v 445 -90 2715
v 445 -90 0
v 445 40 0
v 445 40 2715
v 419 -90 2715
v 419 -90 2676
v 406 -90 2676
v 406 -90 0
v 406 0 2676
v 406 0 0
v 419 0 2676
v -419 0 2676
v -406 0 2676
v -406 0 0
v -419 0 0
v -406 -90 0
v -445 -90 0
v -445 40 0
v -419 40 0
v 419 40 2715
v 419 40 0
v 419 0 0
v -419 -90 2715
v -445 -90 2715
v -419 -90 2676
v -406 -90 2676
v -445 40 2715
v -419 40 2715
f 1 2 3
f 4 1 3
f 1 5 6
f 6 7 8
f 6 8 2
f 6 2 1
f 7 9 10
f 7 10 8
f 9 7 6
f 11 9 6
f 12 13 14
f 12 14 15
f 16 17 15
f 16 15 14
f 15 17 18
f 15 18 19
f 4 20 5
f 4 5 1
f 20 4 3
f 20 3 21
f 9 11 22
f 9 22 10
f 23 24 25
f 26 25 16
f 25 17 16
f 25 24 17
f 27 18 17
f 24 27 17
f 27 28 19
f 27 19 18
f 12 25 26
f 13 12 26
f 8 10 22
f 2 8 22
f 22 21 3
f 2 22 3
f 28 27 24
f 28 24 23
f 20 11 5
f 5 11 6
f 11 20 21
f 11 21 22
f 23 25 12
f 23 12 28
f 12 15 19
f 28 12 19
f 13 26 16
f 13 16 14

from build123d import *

# Parameters (mm, degrees)
F1_DEPTH = 2715
F2_W     = 838
F2_H     = 39
F3_DEPTH = 130


with BuildPart() as f1:
    # F0 (on Top) → F1 (new body)
    with BuildSketch(Plane.XY):
        Polygon((-419, 40), (-445, 40), (-445, -90), (-406, -90), (-406, 0), (-419, 0), align=None)
        Polygon((445, 40), (419, 40), (419, 0), (406, 0), (406, -90), (445, -90), align=None)
    extrude(amount=F1_DEPTH)

    # F2 (on face) → F3 (cut)
    with BuildSketch(Plane.XZ.offset(90)):
        with Locations((0, 2695.5)):
            Rectangle(F2_W, F2_H)
    extrude(amount=-F3_DEPTH, mode=Mode.SUBTRACT)


solid = f1.part
